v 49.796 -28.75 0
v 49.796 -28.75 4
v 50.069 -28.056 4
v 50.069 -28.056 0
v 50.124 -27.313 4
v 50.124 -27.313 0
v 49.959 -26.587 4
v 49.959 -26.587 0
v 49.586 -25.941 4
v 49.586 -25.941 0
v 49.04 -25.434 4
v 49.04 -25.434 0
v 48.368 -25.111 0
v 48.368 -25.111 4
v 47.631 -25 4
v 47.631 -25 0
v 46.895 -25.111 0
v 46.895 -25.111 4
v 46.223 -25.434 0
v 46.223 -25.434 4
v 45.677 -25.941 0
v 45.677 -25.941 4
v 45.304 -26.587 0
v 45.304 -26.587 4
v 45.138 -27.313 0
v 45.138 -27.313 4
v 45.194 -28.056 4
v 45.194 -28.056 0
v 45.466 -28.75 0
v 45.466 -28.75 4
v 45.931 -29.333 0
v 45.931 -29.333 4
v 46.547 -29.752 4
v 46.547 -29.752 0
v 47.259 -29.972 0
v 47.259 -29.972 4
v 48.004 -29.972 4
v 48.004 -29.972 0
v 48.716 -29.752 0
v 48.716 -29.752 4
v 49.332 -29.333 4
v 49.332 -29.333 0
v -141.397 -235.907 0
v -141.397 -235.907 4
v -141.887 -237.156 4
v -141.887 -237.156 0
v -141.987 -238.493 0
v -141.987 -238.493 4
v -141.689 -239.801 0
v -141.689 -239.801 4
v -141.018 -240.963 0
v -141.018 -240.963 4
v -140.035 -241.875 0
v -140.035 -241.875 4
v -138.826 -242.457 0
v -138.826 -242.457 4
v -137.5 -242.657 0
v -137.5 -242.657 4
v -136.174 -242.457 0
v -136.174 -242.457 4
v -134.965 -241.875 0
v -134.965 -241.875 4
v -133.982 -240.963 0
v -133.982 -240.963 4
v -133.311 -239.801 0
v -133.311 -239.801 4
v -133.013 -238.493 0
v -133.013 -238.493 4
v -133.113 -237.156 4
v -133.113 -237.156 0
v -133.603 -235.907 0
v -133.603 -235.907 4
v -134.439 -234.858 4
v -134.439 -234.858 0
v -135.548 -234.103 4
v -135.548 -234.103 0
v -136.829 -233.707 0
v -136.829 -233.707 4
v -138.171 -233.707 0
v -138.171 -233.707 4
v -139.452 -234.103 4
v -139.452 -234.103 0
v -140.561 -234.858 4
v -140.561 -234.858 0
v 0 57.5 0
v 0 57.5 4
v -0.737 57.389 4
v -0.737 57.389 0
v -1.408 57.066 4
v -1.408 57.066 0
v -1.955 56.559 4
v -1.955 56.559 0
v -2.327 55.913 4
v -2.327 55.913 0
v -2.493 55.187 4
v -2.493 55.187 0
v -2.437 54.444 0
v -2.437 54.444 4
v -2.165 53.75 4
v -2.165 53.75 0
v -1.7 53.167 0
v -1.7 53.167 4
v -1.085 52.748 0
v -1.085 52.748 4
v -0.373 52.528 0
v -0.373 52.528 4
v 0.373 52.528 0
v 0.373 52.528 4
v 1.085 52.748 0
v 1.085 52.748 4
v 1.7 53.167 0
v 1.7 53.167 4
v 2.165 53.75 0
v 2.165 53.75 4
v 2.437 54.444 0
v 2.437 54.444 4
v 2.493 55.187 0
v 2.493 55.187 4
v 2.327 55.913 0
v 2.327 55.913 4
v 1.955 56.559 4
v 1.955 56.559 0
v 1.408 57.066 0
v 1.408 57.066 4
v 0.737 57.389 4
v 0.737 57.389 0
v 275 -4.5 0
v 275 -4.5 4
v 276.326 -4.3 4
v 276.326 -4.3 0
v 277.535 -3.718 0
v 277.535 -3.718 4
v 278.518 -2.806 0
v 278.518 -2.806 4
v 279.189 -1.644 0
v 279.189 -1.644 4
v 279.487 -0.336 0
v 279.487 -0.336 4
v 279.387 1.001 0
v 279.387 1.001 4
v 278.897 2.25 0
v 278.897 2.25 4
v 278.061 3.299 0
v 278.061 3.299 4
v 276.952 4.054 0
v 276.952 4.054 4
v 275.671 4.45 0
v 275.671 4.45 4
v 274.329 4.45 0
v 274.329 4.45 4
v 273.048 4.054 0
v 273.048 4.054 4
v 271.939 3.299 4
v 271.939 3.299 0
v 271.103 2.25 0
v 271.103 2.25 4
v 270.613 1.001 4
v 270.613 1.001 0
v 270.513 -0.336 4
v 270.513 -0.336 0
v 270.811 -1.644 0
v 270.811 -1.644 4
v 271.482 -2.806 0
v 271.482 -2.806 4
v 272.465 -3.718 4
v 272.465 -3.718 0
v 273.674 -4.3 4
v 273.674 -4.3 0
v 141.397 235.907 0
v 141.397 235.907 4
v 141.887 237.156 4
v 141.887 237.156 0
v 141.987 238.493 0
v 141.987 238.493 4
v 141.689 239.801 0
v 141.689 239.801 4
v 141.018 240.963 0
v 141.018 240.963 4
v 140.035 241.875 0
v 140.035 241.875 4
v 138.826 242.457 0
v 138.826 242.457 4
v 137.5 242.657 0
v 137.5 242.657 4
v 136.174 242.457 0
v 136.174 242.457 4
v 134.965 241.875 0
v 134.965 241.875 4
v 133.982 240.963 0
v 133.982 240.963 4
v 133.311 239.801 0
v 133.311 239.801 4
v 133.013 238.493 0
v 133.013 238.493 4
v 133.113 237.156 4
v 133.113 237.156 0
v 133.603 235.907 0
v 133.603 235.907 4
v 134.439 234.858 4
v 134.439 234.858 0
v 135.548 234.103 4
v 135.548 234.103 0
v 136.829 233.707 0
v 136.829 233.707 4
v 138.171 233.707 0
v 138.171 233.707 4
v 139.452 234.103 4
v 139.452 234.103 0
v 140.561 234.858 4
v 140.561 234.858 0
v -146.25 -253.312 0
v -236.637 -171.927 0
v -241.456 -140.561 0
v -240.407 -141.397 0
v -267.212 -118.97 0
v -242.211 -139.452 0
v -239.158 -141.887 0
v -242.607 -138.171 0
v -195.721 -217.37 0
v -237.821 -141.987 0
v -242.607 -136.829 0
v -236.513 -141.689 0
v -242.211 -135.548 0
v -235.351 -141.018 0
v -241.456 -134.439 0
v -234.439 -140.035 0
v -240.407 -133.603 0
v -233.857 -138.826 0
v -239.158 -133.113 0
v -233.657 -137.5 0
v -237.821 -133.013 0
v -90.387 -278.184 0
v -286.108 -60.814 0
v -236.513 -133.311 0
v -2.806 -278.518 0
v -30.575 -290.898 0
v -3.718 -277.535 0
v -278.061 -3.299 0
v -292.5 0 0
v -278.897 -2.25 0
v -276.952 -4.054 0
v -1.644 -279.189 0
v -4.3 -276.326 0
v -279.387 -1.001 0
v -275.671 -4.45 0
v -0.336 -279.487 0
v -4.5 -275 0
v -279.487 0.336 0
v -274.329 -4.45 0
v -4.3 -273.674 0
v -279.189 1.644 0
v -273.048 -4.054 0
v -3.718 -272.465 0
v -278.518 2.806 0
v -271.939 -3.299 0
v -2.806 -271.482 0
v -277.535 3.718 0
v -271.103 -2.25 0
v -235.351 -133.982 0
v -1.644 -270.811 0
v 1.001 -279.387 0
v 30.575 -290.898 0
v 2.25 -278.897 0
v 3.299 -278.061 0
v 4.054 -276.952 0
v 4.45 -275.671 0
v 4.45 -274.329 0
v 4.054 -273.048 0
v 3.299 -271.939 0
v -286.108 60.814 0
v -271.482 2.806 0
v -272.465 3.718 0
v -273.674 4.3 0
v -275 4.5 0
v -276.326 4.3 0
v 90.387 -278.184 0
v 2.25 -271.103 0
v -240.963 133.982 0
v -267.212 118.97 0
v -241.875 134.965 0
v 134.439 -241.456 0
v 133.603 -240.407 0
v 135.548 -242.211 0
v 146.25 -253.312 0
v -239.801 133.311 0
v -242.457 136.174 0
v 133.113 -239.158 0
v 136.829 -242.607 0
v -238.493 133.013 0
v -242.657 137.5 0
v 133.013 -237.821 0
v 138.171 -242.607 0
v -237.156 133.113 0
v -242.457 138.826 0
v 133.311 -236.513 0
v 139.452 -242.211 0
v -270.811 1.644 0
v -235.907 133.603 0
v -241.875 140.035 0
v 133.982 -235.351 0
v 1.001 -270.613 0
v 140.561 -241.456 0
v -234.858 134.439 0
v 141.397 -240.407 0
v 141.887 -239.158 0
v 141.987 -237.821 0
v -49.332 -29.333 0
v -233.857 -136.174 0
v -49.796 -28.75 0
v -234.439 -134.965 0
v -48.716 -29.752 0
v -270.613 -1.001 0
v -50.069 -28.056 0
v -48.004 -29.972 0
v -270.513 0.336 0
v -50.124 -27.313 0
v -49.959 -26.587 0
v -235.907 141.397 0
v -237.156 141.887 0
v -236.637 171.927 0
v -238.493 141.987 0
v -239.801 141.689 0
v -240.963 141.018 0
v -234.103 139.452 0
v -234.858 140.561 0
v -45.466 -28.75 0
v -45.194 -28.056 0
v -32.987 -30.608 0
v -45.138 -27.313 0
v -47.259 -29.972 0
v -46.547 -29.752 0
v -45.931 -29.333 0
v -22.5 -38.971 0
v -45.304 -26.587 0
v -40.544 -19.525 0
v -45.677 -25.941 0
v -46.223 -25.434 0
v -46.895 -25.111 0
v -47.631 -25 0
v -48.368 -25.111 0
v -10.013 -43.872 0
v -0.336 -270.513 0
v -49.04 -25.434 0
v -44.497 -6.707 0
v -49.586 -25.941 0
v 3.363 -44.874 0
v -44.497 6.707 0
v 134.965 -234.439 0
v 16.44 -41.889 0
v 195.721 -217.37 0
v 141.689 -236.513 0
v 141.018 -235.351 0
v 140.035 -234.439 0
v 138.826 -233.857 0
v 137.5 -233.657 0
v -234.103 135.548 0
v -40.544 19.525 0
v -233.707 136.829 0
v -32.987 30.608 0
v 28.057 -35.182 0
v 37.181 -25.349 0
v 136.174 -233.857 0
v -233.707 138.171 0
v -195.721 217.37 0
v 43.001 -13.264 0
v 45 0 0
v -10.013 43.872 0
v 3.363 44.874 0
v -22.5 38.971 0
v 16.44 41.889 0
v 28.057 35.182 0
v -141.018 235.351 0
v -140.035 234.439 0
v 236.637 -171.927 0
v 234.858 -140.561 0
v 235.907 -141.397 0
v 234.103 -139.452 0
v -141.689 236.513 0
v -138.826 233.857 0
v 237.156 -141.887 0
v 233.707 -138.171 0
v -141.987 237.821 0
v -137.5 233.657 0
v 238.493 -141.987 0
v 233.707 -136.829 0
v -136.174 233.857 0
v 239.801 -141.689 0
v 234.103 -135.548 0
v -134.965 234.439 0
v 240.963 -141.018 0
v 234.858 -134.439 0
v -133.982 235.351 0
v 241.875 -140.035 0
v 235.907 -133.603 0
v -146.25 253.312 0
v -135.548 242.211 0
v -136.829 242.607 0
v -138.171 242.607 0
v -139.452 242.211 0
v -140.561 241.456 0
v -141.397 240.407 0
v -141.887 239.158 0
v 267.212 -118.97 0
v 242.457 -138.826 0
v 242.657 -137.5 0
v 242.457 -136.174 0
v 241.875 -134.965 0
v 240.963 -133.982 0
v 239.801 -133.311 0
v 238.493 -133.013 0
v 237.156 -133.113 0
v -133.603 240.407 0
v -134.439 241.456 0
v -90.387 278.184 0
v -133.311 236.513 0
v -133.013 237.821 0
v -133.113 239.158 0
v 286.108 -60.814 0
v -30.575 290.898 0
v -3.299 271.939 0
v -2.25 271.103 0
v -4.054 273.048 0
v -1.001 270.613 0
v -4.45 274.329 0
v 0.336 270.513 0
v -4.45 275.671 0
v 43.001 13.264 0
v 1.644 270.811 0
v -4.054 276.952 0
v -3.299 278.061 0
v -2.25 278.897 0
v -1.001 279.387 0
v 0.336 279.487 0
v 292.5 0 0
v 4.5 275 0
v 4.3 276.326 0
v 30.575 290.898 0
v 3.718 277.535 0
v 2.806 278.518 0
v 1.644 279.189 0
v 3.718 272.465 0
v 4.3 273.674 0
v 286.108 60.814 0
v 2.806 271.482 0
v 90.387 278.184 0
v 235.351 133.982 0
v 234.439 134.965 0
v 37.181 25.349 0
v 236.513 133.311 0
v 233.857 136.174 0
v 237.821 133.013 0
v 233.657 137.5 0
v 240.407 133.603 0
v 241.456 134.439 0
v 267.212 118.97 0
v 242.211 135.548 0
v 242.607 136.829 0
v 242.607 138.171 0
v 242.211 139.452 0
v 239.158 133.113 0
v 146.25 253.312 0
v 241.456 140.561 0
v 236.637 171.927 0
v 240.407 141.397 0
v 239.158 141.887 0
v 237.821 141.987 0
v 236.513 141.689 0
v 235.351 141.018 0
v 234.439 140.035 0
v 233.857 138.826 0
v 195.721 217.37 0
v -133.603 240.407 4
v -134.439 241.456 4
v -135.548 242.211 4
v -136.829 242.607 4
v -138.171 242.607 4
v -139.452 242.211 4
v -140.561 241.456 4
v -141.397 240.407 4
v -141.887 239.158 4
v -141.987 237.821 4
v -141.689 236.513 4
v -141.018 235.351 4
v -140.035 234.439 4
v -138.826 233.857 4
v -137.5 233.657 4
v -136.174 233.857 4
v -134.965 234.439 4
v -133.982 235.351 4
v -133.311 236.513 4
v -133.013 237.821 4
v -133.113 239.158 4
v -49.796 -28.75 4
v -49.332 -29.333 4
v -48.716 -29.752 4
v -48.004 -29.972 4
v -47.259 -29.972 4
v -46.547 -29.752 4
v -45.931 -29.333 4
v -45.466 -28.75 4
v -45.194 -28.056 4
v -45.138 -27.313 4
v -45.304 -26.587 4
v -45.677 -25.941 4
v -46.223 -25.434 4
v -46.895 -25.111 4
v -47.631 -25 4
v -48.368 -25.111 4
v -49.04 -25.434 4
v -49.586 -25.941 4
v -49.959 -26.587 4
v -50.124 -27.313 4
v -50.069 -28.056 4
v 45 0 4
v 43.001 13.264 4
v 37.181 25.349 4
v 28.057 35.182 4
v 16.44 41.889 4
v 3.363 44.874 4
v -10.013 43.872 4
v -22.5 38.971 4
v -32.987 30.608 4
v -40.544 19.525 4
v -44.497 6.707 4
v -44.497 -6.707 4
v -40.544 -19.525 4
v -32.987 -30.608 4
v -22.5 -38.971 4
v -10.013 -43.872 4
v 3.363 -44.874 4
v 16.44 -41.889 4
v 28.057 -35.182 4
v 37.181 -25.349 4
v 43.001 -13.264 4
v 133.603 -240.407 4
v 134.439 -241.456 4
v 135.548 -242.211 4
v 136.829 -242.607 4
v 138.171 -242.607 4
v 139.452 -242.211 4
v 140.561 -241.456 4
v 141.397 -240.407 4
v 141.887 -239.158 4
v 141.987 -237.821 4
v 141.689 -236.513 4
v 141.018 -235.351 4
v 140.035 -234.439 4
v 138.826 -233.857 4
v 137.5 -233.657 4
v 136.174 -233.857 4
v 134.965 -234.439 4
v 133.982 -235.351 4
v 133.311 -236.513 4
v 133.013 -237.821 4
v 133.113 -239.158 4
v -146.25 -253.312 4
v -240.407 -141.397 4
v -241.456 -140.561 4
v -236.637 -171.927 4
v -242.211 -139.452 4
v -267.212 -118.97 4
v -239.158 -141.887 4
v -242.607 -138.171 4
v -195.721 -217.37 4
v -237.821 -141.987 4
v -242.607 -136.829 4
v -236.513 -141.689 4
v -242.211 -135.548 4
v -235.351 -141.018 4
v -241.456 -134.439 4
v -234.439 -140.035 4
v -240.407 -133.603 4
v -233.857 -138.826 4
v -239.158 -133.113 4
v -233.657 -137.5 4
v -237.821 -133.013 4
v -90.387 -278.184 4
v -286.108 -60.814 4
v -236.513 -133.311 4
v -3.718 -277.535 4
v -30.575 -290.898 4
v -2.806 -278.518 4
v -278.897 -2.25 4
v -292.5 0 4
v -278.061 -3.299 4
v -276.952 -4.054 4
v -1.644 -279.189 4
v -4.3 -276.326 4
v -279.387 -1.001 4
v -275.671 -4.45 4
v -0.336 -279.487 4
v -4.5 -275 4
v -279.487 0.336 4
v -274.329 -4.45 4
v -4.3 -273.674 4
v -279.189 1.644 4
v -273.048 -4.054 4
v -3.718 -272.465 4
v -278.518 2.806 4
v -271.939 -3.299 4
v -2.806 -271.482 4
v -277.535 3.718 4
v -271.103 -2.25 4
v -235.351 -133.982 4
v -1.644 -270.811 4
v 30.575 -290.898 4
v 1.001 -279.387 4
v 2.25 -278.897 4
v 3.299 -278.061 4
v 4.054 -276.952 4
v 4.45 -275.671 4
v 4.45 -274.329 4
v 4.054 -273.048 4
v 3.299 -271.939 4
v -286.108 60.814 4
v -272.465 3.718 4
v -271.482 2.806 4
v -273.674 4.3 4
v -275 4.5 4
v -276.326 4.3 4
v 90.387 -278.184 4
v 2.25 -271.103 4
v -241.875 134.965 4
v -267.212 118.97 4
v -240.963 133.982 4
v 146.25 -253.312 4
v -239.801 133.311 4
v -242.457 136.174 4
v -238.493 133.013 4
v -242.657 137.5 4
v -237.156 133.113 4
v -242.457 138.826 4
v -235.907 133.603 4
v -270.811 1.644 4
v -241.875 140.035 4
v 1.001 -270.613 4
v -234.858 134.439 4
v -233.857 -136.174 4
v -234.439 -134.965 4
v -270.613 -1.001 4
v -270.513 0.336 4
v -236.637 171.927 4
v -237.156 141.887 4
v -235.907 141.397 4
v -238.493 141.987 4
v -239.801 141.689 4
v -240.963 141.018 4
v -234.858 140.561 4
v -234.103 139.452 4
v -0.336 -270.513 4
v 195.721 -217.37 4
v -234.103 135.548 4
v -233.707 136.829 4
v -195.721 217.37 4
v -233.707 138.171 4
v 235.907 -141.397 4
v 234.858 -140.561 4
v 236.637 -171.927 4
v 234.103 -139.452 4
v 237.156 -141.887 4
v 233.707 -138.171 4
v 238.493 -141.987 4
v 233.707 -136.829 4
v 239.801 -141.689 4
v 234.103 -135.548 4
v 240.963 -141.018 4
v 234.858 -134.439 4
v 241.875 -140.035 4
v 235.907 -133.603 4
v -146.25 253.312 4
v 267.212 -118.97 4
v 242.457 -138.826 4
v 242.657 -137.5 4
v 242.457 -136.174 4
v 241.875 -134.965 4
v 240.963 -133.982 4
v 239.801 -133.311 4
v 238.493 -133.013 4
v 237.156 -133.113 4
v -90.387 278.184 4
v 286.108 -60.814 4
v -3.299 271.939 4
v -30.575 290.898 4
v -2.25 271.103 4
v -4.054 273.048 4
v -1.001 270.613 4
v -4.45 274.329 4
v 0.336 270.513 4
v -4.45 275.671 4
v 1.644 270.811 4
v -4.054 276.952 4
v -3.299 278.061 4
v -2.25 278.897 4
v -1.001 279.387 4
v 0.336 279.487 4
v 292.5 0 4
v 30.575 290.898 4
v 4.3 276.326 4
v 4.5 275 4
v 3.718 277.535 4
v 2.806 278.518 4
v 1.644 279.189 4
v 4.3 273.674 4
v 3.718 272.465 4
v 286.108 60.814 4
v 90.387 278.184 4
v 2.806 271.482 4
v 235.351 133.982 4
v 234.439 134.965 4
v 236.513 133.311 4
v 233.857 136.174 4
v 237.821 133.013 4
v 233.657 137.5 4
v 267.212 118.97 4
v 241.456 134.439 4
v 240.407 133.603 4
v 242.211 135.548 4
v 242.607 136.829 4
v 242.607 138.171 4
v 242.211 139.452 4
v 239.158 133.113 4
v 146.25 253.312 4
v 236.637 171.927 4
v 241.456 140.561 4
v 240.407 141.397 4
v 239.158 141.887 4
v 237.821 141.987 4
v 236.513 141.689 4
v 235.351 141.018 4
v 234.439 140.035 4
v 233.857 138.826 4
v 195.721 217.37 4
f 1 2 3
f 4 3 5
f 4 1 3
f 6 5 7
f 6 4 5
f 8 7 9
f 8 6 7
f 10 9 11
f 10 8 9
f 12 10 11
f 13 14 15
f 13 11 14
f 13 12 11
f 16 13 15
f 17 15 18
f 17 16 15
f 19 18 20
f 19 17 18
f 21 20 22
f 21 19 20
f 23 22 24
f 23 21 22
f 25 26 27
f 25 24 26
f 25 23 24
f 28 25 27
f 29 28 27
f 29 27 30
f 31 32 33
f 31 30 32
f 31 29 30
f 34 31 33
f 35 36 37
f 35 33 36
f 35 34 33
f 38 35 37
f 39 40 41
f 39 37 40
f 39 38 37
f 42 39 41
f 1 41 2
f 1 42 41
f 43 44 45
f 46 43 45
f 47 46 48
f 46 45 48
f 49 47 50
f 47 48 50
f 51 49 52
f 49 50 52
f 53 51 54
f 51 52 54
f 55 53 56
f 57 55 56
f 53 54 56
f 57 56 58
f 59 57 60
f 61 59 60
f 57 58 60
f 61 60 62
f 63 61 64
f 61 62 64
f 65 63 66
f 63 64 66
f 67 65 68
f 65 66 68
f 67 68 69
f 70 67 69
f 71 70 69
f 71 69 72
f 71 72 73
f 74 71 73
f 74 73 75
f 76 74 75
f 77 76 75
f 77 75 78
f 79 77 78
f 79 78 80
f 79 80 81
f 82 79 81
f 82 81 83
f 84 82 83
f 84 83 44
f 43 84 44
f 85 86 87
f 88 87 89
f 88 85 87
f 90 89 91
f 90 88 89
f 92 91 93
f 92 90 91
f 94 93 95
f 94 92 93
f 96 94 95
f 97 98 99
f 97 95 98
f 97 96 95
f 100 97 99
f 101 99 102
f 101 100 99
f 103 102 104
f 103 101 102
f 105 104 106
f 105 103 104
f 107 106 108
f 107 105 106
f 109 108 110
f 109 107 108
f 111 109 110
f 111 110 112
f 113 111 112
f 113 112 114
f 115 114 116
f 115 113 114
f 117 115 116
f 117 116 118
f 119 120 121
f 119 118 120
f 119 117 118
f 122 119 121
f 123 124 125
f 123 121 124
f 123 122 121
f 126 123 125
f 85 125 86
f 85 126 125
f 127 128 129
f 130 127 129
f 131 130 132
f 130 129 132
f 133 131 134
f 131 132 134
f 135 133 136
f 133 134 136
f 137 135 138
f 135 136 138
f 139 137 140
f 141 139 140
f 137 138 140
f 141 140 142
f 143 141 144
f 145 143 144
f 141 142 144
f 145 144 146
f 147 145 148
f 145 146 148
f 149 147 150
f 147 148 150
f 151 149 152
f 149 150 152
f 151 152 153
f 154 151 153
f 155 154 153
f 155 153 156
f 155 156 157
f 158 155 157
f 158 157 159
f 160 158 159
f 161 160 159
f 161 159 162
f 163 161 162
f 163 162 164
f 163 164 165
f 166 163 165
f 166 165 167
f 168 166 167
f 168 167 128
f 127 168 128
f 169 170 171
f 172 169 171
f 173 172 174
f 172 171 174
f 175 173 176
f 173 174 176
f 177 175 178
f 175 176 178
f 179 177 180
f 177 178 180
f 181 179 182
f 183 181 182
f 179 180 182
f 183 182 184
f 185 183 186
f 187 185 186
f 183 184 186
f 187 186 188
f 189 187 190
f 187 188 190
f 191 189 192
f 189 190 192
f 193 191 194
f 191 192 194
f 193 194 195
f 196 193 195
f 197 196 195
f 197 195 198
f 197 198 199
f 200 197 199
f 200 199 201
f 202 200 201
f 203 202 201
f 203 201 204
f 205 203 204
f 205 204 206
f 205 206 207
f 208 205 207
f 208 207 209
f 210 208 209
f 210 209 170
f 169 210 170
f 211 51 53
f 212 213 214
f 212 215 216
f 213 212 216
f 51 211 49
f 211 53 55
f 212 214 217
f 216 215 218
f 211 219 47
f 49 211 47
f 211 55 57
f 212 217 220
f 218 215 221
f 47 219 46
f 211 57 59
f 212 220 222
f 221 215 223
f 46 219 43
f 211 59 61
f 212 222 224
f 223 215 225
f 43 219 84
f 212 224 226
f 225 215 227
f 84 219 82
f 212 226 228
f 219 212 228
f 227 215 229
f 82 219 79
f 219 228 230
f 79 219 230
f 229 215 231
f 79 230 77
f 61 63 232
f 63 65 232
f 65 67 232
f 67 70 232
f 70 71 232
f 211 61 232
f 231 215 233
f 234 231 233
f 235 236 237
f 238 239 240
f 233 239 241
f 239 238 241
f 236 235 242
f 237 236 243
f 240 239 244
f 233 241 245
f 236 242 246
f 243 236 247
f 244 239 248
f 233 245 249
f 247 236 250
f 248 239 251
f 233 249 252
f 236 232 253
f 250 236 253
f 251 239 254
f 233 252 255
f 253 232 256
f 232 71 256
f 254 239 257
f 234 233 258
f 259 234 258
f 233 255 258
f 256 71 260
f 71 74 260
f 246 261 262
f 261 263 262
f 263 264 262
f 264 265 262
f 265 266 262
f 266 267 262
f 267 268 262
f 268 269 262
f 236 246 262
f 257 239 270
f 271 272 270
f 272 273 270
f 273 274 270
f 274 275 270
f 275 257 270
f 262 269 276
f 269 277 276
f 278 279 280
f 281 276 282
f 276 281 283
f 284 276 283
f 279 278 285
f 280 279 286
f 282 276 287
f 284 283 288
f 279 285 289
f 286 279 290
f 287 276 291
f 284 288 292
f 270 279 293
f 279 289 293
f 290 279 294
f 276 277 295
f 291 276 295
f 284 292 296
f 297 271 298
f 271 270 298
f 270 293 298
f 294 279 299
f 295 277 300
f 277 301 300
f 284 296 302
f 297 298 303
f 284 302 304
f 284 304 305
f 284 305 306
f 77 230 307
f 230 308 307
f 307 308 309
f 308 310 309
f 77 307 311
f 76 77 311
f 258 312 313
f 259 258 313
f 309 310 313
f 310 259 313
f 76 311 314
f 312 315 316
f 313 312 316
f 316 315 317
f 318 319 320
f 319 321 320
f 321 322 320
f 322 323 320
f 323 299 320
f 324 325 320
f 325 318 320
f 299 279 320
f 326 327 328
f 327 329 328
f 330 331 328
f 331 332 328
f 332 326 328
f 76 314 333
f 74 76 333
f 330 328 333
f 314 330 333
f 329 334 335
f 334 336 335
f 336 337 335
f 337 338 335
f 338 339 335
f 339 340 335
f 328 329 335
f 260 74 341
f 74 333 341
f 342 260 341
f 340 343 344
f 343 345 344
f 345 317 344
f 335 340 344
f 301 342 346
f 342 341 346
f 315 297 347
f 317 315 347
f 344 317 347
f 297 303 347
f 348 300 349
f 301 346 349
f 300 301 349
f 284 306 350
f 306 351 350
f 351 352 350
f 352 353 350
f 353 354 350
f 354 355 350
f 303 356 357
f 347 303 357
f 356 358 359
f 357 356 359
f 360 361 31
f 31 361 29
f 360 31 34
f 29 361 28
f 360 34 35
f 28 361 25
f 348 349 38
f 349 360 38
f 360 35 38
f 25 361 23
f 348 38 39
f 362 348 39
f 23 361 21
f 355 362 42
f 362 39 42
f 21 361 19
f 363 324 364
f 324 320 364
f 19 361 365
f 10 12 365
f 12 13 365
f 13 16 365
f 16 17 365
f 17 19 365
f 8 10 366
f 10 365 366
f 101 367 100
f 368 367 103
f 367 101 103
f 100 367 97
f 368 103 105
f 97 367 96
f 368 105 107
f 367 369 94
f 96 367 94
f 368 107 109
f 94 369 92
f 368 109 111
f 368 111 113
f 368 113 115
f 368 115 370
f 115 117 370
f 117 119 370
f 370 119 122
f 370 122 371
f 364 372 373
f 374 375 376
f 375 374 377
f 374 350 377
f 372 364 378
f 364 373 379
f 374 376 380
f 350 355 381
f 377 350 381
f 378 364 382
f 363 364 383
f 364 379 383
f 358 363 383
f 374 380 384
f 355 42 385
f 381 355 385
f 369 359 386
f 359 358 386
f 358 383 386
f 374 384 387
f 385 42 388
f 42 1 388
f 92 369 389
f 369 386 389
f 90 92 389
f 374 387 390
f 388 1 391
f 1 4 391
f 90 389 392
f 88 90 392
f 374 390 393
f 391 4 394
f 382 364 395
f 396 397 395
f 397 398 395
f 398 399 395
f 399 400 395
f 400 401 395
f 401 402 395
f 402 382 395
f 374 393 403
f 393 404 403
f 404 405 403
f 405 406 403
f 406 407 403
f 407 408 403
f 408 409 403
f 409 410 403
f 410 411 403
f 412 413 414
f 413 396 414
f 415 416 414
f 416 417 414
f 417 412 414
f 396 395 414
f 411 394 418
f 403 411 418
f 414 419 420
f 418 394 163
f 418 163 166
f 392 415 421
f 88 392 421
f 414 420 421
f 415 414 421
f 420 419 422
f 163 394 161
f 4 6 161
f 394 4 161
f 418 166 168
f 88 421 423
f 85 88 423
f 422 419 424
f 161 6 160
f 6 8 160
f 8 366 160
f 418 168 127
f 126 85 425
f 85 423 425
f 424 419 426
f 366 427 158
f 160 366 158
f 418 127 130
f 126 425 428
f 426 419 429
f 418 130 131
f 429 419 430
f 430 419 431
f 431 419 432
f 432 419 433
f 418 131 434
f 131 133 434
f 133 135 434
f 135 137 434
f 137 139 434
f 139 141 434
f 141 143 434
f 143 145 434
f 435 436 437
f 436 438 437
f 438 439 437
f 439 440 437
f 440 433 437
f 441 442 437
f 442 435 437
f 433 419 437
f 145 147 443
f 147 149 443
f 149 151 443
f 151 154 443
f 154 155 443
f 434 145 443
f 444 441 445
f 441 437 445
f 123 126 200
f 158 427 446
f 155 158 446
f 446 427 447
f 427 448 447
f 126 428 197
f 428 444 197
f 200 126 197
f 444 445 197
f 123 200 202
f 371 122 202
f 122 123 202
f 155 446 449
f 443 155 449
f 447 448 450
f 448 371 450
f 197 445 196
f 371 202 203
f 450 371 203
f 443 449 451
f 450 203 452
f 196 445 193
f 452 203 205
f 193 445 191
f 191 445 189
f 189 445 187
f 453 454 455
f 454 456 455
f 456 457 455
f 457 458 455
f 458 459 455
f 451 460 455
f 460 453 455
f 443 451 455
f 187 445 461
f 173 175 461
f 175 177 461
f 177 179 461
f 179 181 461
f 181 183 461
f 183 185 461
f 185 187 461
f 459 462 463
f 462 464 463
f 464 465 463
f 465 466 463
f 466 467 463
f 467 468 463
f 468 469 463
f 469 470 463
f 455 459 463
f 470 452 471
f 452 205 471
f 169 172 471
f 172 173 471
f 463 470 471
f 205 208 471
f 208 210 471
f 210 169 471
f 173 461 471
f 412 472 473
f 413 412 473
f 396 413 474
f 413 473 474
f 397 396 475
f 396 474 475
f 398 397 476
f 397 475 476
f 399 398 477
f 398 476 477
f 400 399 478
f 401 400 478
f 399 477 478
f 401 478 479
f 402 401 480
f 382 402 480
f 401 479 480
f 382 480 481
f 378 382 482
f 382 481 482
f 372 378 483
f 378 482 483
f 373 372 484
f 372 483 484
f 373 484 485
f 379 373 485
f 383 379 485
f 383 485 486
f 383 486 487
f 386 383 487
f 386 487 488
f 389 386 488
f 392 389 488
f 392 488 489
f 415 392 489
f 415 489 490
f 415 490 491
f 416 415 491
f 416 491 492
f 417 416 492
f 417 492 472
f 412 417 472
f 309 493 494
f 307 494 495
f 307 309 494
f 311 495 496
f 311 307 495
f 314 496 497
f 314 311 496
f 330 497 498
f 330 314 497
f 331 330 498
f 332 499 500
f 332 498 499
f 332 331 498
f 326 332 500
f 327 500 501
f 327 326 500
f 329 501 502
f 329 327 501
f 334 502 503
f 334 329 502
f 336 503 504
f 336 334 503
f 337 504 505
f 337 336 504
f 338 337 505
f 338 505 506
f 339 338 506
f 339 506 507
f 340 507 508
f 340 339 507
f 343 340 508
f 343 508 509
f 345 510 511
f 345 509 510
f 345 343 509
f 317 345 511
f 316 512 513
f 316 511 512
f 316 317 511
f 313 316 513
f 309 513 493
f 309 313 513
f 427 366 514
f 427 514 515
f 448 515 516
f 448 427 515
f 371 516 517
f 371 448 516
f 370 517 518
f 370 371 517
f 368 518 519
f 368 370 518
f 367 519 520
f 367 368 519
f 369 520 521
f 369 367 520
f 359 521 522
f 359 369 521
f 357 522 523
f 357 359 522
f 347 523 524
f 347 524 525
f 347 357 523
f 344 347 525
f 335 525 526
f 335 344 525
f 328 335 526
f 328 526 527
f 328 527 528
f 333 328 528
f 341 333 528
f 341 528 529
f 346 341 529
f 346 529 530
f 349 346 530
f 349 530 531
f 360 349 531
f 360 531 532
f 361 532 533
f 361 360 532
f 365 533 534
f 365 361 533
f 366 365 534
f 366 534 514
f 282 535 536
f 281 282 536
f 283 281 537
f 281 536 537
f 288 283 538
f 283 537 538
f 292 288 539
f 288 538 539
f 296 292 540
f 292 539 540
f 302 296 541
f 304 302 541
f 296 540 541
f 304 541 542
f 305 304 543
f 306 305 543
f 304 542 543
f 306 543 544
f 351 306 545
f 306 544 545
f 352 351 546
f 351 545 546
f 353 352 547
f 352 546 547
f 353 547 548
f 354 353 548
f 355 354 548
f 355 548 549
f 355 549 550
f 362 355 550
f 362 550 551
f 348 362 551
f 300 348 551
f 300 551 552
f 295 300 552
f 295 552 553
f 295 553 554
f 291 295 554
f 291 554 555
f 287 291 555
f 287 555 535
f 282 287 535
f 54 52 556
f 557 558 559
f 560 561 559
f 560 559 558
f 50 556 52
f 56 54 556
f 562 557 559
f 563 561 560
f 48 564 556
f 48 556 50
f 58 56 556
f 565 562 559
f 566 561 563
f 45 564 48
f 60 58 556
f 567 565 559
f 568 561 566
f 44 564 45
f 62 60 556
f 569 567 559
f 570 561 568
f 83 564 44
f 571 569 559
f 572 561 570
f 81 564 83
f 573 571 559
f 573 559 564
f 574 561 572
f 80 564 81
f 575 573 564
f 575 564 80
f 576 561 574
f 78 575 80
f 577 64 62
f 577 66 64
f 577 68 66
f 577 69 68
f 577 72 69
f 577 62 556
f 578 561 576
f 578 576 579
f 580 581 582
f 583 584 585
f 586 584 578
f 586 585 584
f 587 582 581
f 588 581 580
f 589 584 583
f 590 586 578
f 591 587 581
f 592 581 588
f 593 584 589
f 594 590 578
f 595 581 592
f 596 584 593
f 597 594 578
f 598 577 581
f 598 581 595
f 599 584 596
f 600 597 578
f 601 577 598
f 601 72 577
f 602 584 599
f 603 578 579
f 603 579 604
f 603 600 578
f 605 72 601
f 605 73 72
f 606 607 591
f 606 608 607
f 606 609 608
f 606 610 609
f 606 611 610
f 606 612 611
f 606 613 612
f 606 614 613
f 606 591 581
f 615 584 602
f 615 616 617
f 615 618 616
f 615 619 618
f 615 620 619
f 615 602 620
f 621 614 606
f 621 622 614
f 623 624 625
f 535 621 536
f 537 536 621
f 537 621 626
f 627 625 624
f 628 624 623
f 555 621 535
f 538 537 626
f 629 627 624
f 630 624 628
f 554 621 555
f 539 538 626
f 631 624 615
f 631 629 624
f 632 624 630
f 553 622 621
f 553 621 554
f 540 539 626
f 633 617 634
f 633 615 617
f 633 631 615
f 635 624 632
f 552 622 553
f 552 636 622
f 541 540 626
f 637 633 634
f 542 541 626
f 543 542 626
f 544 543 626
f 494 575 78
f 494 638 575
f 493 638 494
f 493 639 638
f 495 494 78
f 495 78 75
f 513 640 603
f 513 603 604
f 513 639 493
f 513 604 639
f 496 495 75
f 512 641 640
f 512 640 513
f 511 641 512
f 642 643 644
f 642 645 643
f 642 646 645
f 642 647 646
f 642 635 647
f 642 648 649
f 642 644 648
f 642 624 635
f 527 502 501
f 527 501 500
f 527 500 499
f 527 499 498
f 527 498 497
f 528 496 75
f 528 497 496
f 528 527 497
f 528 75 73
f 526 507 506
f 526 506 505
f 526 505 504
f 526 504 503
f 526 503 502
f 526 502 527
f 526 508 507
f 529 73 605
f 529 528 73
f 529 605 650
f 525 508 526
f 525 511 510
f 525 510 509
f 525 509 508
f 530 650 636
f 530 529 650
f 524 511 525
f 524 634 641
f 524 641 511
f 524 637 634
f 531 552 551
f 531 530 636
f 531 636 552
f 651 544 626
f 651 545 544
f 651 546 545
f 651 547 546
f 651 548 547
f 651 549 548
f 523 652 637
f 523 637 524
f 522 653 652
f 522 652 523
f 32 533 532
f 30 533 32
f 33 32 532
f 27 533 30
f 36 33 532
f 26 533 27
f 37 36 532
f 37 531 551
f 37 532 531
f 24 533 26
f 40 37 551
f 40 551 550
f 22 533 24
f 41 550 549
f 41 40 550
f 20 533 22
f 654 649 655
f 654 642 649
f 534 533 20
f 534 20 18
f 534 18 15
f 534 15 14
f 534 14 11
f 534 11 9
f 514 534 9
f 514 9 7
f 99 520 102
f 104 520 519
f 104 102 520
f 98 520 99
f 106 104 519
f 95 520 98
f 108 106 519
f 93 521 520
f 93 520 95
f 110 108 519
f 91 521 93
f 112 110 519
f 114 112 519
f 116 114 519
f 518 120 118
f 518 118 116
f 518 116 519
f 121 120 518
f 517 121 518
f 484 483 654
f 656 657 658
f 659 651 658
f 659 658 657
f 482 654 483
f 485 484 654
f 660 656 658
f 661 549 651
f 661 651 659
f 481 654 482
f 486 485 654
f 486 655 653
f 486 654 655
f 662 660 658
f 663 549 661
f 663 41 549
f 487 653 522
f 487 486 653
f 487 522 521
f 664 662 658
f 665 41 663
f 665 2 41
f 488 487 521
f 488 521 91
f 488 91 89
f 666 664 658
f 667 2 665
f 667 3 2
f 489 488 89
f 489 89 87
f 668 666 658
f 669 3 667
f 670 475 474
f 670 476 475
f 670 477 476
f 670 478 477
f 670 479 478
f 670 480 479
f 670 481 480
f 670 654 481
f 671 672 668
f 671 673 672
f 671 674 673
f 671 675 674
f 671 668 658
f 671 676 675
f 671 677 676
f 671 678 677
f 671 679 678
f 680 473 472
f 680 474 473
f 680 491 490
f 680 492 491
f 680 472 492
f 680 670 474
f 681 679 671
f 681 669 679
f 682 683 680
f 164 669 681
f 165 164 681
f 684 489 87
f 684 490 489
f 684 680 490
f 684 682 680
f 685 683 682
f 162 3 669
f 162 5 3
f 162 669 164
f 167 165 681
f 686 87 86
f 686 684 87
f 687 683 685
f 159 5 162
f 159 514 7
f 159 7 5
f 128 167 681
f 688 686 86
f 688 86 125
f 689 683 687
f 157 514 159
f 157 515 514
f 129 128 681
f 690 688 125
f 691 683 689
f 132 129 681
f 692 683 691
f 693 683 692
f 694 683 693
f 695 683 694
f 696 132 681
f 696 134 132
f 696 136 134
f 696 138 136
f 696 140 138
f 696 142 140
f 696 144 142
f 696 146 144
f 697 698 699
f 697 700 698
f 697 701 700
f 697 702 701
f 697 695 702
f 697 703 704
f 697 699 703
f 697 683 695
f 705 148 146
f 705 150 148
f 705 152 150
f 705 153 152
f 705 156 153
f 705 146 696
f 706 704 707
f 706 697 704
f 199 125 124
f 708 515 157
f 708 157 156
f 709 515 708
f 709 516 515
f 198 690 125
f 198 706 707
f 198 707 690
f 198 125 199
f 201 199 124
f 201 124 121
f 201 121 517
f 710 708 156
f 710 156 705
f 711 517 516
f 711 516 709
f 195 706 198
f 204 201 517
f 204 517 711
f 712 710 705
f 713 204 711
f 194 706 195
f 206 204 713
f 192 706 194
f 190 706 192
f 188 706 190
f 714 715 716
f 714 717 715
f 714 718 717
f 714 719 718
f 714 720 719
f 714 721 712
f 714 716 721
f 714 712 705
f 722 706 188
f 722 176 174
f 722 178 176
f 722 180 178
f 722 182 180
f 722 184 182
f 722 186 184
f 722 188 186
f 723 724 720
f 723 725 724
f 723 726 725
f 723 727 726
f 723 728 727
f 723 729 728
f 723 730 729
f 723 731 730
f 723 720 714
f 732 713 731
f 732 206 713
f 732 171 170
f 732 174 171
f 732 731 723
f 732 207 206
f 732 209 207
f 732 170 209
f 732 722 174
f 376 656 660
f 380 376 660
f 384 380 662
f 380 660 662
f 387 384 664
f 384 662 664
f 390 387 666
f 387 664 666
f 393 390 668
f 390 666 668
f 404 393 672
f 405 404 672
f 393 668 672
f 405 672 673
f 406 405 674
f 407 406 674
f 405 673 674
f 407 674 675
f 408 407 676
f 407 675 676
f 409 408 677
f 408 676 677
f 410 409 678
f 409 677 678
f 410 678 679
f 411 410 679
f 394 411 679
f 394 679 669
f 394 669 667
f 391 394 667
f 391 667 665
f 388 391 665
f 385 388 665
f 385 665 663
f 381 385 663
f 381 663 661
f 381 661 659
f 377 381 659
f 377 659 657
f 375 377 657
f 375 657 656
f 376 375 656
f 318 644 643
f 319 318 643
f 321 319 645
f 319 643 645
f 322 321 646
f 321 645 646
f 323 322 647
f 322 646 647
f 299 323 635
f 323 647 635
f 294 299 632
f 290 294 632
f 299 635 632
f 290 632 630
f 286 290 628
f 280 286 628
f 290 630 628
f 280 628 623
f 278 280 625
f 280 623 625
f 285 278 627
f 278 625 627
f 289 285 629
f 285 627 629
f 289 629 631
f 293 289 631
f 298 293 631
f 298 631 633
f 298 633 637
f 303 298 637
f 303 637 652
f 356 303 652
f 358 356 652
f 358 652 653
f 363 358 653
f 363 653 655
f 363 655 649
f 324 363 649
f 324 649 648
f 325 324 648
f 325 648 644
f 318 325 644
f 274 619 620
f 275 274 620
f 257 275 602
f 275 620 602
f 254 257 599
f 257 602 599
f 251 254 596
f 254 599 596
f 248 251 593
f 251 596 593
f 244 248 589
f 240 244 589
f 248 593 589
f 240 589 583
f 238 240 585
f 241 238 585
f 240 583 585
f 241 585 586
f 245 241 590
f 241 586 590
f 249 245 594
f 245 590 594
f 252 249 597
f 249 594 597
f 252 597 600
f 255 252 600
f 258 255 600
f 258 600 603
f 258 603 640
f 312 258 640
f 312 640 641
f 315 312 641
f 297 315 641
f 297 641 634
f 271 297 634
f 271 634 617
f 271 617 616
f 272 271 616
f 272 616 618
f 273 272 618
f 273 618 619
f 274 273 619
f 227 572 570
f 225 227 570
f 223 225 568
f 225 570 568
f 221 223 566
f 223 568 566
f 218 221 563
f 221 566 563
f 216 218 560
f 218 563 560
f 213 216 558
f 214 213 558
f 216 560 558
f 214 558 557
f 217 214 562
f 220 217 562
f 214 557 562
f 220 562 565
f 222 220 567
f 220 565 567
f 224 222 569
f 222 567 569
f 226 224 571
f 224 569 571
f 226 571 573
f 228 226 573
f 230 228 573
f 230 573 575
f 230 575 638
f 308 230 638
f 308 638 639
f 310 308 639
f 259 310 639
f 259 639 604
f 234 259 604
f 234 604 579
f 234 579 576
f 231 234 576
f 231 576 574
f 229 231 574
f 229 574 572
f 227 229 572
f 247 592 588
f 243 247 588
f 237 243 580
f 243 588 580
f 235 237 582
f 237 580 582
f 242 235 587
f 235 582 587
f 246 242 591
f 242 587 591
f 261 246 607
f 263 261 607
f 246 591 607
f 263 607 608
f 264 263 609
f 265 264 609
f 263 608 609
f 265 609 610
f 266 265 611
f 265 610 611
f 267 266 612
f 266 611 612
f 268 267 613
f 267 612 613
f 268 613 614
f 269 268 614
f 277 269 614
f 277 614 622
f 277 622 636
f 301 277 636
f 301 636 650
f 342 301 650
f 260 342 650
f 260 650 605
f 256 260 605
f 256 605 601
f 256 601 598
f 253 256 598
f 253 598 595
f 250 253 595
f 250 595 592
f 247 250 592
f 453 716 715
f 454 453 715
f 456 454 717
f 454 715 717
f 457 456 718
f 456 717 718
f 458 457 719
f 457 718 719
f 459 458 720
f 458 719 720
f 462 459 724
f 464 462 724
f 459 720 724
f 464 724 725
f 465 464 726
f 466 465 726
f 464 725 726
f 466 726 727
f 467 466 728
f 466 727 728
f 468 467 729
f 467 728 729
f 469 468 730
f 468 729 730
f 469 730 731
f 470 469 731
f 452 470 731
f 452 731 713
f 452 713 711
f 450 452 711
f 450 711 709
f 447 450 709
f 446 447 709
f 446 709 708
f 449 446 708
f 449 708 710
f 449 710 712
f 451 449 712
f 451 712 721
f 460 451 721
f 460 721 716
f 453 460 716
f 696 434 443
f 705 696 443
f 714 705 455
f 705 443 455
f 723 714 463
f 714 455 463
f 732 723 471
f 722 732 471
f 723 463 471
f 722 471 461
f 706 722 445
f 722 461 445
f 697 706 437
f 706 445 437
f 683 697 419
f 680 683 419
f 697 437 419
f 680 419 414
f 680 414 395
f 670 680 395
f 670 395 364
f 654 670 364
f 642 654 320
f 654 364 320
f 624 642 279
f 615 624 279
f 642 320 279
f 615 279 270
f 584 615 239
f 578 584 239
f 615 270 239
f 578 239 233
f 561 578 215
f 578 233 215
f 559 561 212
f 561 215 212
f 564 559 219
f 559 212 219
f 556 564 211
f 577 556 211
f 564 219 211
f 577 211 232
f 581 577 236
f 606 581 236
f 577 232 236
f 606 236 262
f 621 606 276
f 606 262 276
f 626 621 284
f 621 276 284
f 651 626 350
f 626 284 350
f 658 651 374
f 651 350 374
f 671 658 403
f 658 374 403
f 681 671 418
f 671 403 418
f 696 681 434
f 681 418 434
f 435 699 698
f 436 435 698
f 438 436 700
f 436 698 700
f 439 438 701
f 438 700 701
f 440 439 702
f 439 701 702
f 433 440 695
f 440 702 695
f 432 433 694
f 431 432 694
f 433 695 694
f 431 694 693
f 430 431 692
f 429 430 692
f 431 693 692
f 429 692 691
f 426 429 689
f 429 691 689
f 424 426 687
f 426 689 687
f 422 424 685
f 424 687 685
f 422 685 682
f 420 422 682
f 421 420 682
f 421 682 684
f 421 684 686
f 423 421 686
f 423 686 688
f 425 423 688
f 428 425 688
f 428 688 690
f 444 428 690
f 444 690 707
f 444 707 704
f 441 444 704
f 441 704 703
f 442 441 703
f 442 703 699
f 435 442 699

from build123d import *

# Parameters (mm, degrees)
SKETCH1_R           = 292.5
SKETCH1_R_2         = 45
BOSS_EXTRUDE1_DEPTH = 4
SKETCH2_R           = 4.5
CUT_EXTRUDE1_DEPTH  = 414.676806215
CIRPATTERN1_COUNT   = 12
CIRPATTERN3_COUNT   = 3


with BuildPart() as part:
    # Sketch1 → Boss-Extrude1 (new body)
    with BuildSketch(Plane.XY):
        Circle(SKETCH1_R)
        Circle(SKETCH1_R_2, mode=Mode.SUBTRACT)
    extrude(amount=BOSS_EXTRUDE1_DEPTH)

    # Sketch2 → Cut-Extrude1 (cut, through all)
    with BuildSketch(Plane.XY.offset(4)):
        with Locations((0, 275)):
            Circle(SKETCH2_R)
    cut_extrude1 = extrude(amount=-CUT_EXTRUDE1_DEPTH, mode=Mode.SUBTRACT)

    # CirPattern1: Cut-Extrude1 ×12 about axis
    cirpattern1_axis = Axis((0, 0, 0), (0, 0, 1))
    for i in range(1, CIRPATTERN1_COUNT):
        add(cut_extrude1.rotate(cirpattern1_axis, i * 360 / CIRPATTERN1_COUNT), mode=Mode.SUBTRACT)

    # Sketch6 → M6x1.0 Tapped Hole1 (revolve, cut)
    with BuildSketch(Plane(origin=(0, 55, 0), x_dir=(0, 1, 0), z_dir=(1, 0, 0))):
        Polygon((0, 0), (0, 16.502151548), (2.5, 15), (2.5, 0), align=None)
    m6x1_0_tapped_hole1 = revolve(axis=Axis((0, 55, -6.35), (0, 0, 1)), mode=Mode.SUBTRACT)

    # CirPattern3: M6x1.0 Tapped Hole1 ×3 about axis
    cirpattern3_axis = Axis((0, 0, 0), (0, 0, 1))
    for i in range(1, CIRPATTERN3_COUNT):
        add(m6x1_0_tapped_hole1.rotate(cirpattern3_axis, i * 360 / CIRPATTERN3_COUNT), mode=Mode.SUBTRACT)


solid = part.part
